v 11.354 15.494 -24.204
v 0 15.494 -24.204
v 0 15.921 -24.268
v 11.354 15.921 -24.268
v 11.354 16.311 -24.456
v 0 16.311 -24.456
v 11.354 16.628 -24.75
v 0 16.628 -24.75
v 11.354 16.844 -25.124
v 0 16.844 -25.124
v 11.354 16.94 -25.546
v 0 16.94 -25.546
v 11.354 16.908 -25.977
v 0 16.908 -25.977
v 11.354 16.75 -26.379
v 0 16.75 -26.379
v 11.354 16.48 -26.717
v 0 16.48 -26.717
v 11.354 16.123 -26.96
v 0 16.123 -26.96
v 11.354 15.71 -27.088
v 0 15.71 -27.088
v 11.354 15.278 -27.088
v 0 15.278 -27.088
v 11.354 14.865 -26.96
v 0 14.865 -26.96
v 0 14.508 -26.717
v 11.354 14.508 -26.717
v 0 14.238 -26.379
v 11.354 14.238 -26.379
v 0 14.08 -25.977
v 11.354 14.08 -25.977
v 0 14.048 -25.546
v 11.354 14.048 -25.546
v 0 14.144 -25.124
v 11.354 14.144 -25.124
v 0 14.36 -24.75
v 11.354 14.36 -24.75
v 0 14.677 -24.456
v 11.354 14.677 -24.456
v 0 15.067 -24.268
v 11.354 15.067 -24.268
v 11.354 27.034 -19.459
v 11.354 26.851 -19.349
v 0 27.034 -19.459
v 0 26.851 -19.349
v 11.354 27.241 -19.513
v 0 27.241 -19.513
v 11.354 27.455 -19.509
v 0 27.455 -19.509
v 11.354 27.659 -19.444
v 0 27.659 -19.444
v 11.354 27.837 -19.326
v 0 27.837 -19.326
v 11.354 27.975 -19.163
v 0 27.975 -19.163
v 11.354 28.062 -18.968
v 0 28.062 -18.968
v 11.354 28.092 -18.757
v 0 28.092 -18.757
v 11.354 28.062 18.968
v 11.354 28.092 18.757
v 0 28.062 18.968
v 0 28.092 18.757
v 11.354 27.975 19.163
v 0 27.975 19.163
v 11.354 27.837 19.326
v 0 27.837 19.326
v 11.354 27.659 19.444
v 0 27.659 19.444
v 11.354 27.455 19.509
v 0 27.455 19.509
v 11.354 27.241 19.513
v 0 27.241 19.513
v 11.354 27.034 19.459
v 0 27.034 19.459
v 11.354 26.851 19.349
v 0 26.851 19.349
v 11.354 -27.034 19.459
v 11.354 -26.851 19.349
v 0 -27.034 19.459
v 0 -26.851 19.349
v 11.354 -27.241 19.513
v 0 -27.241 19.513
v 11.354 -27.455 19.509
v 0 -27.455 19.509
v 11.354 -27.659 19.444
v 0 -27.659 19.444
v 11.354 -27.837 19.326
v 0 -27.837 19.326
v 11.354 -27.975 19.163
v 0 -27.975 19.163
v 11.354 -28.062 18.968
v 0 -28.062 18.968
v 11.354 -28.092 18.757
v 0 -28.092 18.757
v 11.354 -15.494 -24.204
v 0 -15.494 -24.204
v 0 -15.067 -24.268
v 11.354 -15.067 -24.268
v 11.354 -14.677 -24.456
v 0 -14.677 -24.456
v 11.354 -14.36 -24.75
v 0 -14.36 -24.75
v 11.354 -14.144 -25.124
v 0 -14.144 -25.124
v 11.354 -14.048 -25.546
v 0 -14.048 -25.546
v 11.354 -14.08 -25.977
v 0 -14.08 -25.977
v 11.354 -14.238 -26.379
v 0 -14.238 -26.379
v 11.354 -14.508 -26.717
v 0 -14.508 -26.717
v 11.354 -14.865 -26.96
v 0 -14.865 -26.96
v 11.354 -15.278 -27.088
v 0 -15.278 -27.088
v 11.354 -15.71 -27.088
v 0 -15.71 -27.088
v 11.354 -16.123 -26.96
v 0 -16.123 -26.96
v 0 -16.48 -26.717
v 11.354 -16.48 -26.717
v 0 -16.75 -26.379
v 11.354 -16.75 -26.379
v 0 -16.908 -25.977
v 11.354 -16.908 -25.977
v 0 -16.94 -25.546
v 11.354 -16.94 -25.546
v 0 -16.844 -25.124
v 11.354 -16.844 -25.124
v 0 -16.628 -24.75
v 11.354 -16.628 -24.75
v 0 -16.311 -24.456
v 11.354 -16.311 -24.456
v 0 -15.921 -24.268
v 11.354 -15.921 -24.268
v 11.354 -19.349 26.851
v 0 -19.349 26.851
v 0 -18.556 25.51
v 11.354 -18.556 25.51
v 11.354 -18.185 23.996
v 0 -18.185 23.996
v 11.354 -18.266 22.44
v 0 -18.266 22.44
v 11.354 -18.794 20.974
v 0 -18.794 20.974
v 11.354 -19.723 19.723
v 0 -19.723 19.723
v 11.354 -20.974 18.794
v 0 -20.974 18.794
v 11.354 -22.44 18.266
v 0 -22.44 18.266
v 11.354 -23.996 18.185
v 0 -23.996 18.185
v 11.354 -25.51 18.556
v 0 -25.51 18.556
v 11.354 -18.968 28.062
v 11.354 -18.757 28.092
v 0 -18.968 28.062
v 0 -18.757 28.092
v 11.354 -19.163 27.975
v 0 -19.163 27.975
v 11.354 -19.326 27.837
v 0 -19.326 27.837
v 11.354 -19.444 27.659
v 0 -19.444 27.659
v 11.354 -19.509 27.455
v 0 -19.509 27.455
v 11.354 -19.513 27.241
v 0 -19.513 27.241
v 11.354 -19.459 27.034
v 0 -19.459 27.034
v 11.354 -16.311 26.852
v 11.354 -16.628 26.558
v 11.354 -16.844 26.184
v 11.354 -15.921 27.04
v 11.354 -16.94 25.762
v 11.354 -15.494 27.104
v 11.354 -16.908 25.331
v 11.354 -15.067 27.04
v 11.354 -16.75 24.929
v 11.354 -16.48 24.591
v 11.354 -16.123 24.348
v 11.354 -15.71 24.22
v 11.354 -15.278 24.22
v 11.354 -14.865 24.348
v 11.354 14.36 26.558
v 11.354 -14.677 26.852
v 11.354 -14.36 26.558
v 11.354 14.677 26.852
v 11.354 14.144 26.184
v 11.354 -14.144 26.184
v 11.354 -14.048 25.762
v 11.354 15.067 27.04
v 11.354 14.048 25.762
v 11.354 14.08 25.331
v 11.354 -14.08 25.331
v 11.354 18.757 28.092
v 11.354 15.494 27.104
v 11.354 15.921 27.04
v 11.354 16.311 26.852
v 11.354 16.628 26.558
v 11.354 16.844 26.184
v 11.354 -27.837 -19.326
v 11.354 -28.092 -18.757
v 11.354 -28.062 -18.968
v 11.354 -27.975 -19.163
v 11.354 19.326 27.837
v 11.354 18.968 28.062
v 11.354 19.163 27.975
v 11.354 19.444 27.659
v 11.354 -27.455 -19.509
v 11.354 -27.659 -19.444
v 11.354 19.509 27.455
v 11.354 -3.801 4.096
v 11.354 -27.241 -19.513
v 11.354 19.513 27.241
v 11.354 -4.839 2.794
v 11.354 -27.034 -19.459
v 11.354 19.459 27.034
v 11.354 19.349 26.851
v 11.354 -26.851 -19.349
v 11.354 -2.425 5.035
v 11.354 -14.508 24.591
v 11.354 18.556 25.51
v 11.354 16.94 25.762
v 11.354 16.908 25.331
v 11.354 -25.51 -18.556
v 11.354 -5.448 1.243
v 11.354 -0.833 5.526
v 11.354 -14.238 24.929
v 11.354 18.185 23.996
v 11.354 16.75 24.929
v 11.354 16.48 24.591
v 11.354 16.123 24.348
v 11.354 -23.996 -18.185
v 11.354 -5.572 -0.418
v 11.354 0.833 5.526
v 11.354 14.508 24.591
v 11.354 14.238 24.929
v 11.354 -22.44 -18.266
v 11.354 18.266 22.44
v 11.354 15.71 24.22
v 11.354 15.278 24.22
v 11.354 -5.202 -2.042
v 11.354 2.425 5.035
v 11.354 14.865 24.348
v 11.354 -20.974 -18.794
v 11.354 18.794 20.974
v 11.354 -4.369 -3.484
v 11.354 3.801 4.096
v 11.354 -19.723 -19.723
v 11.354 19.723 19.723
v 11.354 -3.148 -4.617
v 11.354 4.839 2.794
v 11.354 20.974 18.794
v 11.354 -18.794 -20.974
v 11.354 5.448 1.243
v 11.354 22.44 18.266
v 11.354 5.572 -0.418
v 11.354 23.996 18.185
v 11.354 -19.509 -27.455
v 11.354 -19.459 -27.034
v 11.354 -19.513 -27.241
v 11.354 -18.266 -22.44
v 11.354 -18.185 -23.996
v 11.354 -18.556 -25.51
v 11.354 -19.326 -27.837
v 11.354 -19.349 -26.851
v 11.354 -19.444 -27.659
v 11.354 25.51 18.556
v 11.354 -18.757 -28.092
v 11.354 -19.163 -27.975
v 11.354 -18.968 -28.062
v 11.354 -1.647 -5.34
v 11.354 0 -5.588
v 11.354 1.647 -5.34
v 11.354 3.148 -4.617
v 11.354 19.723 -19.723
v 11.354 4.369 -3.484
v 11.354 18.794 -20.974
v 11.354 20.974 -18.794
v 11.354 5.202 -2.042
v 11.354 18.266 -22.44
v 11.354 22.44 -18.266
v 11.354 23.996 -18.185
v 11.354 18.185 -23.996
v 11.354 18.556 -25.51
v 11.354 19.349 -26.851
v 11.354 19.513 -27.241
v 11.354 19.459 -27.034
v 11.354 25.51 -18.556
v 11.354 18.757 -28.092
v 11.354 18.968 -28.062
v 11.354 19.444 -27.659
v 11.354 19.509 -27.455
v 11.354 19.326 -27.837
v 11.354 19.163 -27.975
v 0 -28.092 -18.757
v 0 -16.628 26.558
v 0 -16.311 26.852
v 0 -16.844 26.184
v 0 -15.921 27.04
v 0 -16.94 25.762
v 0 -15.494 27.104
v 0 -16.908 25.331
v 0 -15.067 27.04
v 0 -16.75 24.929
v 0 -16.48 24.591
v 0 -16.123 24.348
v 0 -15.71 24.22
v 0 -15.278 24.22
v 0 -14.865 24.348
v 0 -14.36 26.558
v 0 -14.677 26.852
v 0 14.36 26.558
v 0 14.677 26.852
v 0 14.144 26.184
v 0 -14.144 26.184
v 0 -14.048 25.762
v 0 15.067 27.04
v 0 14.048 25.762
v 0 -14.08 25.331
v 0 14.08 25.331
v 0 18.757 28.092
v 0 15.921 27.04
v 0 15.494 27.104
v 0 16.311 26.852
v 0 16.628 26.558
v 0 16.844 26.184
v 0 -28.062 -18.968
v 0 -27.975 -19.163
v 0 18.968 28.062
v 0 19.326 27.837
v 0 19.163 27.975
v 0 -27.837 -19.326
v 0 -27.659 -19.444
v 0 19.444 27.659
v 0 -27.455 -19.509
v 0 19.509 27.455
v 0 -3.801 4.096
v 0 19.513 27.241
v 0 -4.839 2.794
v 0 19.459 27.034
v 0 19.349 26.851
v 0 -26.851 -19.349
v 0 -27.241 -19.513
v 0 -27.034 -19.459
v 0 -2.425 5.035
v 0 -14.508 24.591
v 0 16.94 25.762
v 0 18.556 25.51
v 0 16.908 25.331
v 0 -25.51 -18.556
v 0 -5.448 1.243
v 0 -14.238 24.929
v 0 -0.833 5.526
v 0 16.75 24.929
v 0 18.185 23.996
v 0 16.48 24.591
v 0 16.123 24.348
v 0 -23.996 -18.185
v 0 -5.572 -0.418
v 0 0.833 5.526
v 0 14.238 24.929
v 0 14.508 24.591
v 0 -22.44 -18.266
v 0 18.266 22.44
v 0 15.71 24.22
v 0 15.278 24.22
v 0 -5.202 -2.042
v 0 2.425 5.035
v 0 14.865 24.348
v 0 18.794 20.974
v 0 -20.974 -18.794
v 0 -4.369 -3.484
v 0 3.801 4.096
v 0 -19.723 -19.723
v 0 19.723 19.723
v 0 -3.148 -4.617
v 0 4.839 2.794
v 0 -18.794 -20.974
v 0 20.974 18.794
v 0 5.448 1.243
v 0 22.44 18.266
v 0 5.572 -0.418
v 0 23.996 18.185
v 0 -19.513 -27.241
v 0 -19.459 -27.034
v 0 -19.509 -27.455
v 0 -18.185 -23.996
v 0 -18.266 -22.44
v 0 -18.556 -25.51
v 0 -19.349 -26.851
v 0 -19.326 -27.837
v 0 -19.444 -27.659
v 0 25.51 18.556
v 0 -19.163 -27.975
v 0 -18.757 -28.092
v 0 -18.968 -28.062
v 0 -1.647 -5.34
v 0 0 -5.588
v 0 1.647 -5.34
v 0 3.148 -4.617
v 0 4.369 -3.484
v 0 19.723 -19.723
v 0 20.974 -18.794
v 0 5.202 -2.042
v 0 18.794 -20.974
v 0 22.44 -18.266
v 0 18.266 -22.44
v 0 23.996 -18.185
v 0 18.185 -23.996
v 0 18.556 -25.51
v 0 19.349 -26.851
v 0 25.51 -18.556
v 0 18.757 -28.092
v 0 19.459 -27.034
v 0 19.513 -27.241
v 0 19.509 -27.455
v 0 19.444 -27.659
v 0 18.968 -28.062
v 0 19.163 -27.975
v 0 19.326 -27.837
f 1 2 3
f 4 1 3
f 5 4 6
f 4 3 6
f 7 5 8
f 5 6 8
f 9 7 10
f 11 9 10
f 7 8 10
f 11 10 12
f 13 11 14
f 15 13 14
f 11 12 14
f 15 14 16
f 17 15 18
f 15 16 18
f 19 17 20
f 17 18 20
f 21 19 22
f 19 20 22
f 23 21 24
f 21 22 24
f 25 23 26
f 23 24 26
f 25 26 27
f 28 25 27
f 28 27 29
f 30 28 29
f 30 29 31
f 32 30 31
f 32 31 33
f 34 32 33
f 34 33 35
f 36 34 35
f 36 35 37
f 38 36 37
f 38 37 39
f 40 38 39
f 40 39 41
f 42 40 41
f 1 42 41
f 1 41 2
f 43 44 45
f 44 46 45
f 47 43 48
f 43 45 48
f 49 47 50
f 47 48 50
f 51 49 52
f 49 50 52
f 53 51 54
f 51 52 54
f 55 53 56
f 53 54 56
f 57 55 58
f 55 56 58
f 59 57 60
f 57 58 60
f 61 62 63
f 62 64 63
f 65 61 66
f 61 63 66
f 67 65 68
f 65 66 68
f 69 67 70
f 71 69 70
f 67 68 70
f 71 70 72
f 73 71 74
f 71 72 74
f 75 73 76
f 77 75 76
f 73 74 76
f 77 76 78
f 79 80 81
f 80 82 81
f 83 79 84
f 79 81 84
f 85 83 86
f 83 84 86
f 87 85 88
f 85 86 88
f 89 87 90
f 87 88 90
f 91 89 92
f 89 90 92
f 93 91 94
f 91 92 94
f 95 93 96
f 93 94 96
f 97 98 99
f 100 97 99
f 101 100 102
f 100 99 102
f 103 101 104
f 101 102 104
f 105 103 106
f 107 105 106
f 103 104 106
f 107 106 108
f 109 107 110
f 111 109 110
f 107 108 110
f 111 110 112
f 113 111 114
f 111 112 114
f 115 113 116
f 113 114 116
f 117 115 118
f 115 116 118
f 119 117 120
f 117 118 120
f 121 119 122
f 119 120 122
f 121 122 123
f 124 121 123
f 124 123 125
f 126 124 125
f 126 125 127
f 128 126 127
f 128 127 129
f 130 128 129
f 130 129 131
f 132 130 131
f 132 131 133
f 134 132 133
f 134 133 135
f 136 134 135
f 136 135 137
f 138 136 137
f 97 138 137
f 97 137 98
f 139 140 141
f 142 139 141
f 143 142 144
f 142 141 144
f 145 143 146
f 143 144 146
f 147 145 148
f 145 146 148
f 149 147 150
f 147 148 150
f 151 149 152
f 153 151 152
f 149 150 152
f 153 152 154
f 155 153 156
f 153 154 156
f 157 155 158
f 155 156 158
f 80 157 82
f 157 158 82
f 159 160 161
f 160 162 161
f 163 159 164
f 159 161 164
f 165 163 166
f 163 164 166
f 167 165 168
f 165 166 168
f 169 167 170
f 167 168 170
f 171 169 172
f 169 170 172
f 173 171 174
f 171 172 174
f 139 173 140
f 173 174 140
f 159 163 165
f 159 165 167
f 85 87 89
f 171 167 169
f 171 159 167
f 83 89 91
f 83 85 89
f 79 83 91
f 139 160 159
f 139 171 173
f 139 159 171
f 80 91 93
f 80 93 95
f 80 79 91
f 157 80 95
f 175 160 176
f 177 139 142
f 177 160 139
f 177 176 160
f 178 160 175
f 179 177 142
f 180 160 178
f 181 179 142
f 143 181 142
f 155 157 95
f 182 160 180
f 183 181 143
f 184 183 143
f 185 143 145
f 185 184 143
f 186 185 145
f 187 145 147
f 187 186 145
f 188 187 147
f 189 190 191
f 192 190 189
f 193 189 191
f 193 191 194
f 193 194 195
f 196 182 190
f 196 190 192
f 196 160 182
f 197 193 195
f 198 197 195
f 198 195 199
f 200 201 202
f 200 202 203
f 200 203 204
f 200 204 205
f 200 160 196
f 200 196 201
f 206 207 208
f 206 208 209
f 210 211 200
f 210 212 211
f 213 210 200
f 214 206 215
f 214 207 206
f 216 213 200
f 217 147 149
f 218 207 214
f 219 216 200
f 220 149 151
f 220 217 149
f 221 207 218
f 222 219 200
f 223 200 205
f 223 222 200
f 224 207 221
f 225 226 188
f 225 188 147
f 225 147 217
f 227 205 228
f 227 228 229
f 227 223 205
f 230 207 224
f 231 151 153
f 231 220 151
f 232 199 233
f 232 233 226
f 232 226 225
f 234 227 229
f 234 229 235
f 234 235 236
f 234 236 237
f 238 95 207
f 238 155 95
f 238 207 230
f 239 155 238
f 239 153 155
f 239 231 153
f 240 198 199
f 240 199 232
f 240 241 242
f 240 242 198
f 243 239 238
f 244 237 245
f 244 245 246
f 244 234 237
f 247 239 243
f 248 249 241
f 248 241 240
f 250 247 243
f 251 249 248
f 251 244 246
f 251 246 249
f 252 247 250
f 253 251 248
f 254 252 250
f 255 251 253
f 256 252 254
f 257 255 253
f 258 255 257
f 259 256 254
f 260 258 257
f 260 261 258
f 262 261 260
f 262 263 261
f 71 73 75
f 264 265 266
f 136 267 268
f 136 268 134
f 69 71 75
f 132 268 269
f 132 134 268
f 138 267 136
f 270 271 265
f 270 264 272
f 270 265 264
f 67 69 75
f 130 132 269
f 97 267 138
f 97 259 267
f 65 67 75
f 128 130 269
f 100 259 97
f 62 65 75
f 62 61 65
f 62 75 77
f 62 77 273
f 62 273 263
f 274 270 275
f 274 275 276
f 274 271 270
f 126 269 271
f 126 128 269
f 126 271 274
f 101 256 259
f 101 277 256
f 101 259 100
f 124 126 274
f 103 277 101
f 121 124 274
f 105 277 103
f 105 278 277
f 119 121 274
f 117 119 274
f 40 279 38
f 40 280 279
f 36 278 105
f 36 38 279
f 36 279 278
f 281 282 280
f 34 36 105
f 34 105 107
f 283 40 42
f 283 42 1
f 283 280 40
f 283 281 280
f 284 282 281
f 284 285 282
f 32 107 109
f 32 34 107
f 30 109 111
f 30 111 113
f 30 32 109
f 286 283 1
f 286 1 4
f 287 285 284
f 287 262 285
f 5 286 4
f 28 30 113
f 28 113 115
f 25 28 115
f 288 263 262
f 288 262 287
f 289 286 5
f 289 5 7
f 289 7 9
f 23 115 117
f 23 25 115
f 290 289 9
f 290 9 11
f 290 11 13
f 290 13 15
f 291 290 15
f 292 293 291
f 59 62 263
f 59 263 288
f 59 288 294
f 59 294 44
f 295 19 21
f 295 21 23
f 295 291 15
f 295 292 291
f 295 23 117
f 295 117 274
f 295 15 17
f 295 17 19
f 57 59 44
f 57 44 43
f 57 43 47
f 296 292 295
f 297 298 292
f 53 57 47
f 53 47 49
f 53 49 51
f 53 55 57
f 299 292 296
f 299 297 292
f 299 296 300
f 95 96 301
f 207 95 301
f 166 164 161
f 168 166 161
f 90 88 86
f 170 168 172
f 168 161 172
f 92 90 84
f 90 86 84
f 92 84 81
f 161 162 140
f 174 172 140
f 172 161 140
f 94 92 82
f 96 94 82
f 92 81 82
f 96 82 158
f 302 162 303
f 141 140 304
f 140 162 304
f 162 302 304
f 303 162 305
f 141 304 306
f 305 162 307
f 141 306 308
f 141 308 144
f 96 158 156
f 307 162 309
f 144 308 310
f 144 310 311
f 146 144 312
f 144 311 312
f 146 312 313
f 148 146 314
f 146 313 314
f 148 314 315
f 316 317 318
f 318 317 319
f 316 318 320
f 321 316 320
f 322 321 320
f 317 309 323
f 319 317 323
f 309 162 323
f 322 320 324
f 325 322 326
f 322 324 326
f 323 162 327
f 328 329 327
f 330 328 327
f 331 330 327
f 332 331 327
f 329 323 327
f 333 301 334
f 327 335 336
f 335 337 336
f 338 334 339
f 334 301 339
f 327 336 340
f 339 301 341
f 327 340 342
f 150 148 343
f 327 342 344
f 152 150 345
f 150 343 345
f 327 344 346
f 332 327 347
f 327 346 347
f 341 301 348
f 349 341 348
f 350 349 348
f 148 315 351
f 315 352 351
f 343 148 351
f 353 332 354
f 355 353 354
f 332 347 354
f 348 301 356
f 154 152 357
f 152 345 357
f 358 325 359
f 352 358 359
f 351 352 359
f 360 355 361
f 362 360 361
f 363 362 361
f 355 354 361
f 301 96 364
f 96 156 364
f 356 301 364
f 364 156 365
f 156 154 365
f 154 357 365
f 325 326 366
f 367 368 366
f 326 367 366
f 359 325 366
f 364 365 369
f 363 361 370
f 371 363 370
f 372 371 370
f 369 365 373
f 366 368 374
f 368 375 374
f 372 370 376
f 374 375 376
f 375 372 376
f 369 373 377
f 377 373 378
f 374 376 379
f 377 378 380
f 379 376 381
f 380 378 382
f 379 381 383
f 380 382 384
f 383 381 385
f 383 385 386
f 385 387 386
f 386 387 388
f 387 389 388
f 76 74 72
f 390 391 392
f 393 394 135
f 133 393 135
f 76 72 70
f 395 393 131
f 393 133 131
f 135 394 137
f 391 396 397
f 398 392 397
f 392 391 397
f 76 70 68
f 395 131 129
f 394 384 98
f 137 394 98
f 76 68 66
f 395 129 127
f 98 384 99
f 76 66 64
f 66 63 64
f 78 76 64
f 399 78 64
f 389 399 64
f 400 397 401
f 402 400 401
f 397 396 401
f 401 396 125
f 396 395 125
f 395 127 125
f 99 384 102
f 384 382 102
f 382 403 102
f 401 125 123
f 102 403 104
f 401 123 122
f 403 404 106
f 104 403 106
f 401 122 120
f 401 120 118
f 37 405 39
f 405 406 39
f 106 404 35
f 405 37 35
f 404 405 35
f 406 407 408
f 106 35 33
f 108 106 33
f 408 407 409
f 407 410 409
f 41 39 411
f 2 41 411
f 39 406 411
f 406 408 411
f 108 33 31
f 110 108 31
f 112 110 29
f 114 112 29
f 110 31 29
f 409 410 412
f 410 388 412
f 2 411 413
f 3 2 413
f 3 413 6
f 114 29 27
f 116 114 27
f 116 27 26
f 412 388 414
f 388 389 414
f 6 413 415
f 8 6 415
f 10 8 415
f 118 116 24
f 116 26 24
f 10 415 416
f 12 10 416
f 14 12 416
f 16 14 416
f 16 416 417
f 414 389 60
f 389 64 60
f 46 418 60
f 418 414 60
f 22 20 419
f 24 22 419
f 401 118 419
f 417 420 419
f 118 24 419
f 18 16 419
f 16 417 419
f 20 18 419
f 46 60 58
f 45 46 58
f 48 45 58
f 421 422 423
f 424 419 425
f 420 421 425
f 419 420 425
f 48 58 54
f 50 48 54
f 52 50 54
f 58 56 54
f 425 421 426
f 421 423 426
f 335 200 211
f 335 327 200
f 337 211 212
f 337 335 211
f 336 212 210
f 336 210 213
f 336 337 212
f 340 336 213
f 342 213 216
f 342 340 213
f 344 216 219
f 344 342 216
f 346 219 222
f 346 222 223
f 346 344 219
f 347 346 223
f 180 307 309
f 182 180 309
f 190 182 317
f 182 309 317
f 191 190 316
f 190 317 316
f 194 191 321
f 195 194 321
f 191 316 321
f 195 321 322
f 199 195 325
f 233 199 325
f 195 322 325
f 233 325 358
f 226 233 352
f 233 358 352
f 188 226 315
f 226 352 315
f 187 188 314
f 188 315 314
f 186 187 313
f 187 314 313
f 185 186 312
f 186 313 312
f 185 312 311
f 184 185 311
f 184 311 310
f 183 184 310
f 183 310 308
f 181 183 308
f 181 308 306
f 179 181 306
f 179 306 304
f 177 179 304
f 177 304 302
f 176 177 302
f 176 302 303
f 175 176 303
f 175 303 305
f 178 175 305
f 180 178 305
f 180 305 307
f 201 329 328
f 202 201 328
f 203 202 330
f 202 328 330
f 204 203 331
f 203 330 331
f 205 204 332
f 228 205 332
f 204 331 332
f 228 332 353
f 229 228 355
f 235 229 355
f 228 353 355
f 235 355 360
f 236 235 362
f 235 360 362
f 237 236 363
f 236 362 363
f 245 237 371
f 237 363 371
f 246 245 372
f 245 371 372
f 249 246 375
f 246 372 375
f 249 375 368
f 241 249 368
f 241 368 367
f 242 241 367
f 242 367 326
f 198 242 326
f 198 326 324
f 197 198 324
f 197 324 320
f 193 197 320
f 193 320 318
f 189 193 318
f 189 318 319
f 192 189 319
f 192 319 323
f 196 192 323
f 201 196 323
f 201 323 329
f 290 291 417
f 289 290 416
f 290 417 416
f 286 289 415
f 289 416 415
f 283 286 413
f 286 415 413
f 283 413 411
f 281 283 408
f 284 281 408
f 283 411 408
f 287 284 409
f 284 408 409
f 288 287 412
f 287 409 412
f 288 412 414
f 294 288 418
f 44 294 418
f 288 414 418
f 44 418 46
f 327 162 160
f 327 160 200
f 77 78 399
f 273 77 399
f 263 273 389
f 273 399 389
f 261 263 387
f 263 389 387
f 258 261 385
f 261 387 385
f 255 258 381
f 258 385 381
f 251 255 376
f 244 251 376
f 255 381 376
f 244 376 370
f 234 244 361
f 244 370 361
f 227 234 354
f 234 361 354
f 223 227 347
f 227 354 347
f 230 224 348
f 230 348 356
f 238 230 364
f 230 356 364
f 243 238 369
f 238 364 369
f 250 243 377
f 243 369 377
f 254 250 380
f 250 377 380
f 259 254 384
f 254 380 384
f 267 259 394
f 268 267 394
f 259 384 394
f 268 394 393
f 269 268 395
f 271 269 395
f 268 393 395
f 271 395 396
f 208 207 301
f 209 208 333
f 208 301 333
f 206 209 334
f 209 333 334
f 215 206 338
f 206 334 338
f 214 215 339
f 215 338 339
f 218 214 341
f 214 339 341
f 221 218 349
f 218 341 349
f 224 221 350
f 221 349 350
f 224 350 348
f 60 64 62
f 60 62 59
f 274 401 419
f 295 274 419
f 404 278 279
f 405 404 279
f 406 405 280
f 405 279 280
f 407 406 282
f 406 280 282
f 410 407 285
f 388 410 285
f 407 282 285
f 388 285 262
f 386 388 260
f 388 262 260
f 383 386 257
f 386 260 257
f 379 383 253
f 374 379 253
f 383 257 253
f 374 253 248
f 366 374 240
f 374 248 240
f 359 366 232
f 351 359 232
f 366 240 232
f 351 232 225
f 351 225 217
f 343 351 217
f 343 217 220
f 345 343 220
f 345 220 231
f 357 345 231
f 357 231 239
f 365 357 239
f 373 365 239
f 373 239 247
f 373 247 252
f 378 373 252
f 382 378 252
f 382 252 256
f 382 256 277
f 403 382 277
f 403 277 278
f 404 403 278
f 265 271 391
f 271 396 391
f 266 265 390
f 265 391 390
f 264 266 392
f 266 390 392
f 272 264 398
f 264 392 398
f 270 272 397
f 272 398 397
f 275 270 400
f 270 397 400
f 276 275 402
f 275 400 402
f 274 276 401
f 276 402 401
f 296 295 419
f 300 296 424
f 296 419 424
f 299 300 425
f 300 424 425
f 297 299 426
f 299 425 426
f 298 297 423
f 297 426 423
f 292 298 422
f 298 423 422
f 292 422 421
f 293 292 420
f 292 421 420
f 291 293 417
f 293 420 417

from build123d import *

# Parameters (mm, degrees)
SKETCH1_W               = 56.1848
SKETCH1_H               = 56.1848
BOSS_EXTRUDE1_DEPTH     = 11.3538
SKETCH2_R               = 2.54
CUT_EXTRUDE1_DEPTH      = 42.31918017
FILLET1_R               = 3.175
SKETCH7_R               = 5.334
CUT_EXTRUDE5_DEPTH      = 42.31918017
FILLET4_R               = 0.762
M3_5X0_6_TAPPED_HOLE1_D = 2.9
SKETCH11_R              = 5.588
CUT_EXTRUDE6_DEPTH      = 42.31918017


with BuildPart() as part:
    # Sketch1 → Boss-Extrude1 (new body)
    with BuildSketch(Plane(origin=(0, 0, 0), x_dir=(0, 0, -1), z_dir=(1, 0, 0))):
        Rectangle(SKETCH1_W, SKETCH1_H)
    extrude(amount=BOSS_EXTRUDE1_DEPTH)

    # Sketch2 → Cut-Extrude1 (cut, through all)
    with BuildSketch(Plane(origin=(11.3538, 0, 0), x_dir=(0, 0, -1), z_dir=(1, 0, 0))):
        with Locations((-23.495, 23.495)):
            Circle(SKETCH2_R)
        with Locations(Location((23.495, 23.495, 0), (0, 0, 180))):
            Circle(SKETCH2_R)
        with Locations((23.495, -23.495)):
            Circle(SKETCH2_R)
        with Locations(Location((-23.495, -23.495, 0), (0, 0, 180))):
            Circle(SKETCH2_R)
    extrude(amount=-CUT_EXTRUDE1_DEPTH, mode=Mode.SUBTRACT)

    # Fillet1
    fillet1_edges = [part.edges().sort_by_distance(p)[0] for p in [
        (5.6769, -28.0924, -28.0924),
        (5.6769, -28.0924, 28.0924),
        (5.6769, 28.0924, 28.0924),
        (5.6769, 28.0924, -28.0924),
    ]]
    fillet(fillet1_edges, radius=FILLET1_R)

    # Sketch7 → Cut-Extrude5 (cut, through all)
    with BuildSketch(Plane.ZY):
        with Locations((-23.495, 23.495)):
            Circle(SKETCH7_R)
        with Locations((23.495, 23.495)):
            Circle(SKETCH7_R)
        with Locations((23.495, -23.495)):
            Circle(SKETCH7_R)
        with Locations((-23.495, -23.495)):
            Circle(SKETCH7_R)
    extrude(amount=-CUT_EXTRUDE5_DEPTH, mode=Mode.SUBTRACT)

    # Fillet4
    fillet4_edges = [part.edges().sort_by_distance(p)[0] for p in [
        (5.6769, 20.790287586, -28.0924),
        (5.6769, 28.0924, -20.790287586),
        (5.6769, 28.0924, 20.790287586),
        (5.6769, 20.790287586, 28.0924),
        (5.6769, -20.790287586, 28.0924),
        (5.6769, -28.0924, 20.790287586),
        (5.6769, -20.790287586, -28.0924),
        (5.6769, -28.0924, -20.790287586),
    ]]
    fillet(fillet4_edges, radius=FILLET4_R)

    # M3.5x0.6 Tapped Hole1 (through all)
    with Locations(Plane(origin=(11.3538, 0, 0), x_dir=(0, 0, -1), z_dir=(1, 0, 0))):
        with Locations((-25.654, 15.494), (25.654, 15.494), (25.654, -15.494), (-25.654, -15.494)):
            Hole(M3_5X0_6_TAPPED_HOLE1_D / 2)

    # Sketch11 → Cut-Extrude6 (cut, through all)
    with BuildSketch(Plane(origin=(11.3538, 0, 0), x_dir=(0, 0, -1), z_dir=(1, 0, 0))):
        Circle(SKETCH11_R)
    extrude(amount=-CUT_EXTRUDE6_DEPTH, mode=Mode.SUBTRACT)


solid = part.part
